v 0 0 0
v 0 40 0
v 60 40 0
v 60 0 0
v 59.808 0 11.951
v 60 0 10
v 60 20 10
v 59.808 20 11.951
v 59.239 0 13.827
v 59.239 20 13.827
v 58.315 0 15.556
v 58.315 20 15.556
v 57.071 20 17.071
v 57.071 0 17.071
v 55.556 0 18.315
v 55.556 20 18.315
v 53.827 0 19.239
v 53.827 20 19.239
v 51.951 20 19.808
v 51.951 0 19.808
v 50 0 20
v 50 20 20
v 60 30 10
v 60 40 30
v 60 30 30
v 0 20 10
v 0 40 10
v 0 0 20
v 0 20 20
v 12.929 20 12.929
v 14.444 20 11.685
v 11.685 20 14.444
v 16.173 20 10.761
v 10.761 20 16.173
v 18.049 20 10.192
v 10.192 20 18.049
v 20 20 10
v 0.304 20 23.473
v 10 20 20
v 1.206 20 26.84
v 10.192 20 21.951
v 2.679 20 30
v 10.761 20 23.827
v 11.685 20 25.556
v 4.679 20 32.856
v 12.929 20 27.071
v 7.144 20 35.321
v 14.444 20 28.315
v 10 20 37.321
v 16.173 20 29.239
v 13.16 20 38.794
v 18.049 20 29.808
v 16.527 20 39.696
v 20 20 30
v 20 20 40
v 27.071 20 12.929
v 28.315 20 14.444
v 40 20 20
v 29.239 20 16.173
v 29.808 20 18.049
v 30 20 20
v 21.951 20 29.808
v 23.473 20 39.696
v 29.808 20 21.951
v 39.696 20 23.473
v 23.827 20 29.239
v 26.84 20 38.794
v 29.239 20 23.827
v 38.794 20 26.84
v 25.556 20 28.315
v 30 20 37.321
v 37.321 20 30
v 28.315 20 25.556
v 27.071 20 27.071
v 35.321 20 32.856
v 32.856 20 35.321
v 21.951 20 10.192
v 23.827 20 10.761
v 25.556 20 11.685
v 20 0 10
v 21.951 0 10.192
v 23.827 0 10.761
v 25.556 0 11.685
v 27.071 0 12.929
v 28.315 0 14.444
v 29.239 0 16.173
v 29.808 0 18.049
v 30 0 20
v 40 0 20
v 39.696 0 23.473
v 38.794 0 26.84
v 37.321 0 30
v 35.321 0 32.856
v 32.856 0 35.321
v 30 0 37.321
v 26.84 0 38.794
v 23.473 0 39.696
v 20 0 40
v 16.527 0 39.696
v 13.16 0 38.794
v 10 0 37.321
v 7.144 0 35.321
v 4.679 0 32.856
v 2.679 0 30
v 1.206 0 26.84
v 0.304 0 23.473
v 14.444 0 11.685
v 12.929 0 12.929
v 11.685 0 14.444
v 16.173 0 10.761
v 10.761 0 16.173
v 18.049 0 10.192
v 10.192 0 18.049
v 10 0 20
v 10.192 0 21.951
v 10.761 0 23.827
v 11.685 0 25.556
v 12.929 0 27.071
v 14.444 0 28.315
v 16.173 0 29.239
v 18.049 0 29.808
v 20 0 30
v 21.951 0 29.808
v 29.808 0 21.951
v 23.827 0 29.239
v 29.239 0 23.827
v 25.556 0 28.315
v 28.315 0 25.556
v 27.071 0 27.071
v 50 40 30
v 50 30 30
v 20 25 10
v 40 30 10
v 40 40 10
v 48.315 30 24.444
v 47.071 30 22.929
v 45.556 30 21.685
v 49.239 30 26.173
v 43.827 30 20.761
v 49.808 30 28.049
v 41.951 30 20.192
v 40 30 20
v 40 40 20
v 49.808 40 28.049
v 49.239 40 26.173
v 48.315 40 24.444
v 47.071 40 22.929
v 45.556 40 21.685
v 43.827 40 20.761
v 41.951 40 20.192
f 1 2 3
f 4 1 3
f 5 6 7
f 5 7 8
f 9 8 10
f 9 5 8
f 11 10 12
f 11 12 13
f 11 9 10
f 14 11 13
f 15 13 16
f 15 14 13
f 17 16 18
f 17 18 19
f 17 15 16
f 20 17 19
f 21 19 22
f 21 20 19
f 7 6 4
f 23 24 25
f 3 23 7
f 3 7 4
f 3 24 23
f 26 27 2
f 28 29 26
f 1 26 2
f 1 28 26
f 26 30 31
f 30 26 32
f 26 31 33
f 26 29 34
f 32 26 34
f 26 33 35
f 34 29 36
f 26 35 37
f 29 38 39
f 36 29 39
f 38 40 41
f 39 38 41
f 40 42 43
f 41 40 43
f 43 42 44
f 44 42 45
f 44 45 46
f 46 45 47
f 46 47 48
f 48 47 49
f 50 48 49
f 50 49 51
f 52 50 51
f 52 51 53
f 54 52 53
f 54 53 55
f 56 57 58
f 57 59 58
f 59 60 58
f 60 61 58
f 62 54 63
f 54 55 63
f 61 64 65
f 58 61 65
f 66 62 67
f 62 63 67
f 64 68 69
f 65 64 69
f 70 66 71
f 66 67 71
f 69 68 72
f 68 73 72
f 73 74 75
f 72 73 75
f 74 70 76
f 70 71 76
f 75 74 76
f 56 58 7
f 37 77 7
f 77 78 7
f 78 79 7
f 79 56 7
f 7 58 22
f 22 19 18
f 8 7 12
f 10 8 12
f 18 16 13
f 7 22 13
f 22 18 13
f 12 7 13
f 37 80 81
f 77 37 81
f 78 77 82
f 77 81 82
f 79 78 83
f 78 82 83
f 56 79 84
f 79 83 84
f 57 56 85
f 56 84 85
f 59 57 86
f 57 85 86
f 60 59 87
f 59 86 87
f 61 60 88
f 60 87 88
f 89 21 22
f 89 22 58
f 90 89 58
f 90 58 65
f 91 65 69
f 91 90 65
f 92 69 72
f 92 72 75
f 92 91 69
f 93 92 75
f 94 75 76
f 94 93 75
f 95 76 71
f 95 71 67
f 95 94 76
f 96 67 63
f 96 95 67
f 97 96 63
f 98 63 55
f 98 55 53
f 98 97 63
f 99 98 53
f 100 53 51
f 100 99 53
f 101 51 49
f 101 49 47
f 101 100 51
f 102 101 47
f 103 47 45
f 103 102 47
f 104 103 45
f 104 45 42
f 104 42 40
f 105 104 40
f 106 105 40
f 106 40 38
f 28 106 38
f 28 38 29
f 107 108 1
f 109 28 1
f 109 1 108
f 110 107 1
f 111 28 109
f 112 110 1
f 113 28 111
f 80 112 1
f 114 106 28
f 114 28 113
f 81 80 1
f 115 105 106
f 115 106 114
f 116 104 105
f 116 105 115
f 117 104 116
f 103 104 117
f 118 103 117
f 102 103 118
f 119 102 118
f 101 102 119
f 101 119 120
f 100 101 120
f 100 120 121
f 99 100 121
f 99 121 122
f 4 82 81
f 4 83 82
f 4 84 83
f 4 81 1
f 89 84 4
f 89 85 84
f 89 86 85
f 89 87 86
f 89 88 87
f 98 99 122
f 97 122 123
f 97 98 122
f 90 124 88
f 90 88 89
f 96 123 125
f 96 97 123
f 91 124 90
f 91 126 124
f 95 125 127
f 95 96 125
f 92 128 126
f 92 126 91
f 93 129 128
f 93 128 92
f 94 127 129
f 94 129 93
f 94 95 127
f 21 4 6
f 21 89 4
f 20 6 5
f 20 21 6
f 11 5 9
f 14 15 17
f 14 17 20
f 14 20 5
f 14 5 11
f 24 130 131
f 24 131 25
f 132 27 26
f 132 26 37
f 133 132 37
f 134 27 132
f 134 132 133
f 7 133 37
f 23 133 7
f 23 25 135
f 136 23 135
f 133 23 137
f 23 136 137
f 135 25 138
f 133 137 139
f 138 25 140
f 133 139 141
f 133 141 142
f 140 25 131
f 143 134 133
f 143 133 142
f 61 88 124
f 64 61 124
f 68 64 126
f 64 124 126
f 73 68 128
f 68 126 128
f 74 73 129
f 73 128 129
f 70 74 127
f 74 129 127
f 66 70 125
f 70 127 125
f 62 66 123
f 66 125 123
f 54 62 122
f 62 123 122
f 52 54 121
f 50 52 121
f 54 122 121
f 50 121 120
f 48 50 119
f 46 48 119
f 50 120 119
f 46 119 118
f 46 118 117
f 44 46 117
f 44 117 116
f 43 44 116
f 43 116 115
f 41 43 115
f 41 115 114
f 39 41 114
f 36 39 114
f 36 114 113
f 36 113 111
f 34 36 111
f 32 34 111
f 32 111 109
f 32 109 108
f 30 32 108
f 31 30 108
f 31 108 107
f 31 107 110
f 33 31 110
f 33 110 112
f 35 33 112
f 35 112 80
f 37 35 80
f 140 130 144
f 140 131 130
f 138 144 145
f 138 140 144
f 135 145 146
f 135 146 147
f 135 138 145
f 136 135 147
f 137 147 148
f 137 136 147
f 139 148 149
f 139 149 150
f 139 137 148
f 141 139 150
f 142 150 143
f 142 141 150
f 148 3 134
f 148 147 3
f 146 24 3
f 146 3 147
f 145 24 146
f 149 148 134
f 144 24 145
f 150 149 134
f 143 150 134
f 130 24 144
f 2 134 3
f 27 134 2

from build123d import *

# Parameters (mm, degrees)
F0_W     = 60
F0_H     = 40
F1_DEPTH = 10
F3_DEPTH = 20
F5_DEPTH = 25
F7_DEPTH = 10
F8_R     = 9.99999


# Not quite as in the source:
# - a fillet or chamfer is up to 0.001 mm smaller than in the source, because OpenCascade refuses the exact size


with BuildPart() as f1:
    # F0 (on Top) → F1 (new body)
    with BuildSketch(Plane.XY):
        with Locations((30, 20)):
            Rectangle(F0_W, F0_H)
    extrude(amount=F1_DEPTH)

    # F2 (on Front) → F3 (join)
    with BuildSketch(Plane.XZ):
        with BuildLine():
            Line((50, 20), (40, 20))
            ThreePointArc((40, 20), (20, 40), (0, 20))
            Line((0, 20), (0, 10))
            Line((0, 10), (60, 10))
            ThreePointArc((60, 10), (57.0710678119, 17.0710678119), (50, 20))
        make_face()
    extrude(amount=-F3_DEPTH)

    # F4 (on face) → F5 (cut)
    with BuildSketch(Plane.XZ):
        with BuildLine():
            ThreePointArc((30, 20), (12.928932207, 27.0710678307), (19.9999999466, 10))
            ThreePointArc((19.9999999466, 10), (27.071067793, 12.9289321693), (30, 20))
        make_face()
    extrude(amount=-F5_DEPTH, mode=Mode.SUBTRACT)

    # F6 (on face) → F7 (join)
    with BuildSketch(Plane(origin=(0, 40, 0), x_dir=(-1, 0, 0), z_dir=(0, 1, 0))):
        Polygon((-60, 30), (-60, 10), (-40, 10), (-40, 20), (-50, 20), (-50, 30), align=None)
    extrude(amount=-F7_DEPTH)

    # F8 (radius 10 in the source; OpenCascade refuses exactly that, so slightly less here)
    f8_edges = [f1.edges().sort_by_distance(p)[0] for p in [
        (50, 35, 20),
    ]]
    fillet(f8_edges, radius=F8_R)


solid = f1.part
